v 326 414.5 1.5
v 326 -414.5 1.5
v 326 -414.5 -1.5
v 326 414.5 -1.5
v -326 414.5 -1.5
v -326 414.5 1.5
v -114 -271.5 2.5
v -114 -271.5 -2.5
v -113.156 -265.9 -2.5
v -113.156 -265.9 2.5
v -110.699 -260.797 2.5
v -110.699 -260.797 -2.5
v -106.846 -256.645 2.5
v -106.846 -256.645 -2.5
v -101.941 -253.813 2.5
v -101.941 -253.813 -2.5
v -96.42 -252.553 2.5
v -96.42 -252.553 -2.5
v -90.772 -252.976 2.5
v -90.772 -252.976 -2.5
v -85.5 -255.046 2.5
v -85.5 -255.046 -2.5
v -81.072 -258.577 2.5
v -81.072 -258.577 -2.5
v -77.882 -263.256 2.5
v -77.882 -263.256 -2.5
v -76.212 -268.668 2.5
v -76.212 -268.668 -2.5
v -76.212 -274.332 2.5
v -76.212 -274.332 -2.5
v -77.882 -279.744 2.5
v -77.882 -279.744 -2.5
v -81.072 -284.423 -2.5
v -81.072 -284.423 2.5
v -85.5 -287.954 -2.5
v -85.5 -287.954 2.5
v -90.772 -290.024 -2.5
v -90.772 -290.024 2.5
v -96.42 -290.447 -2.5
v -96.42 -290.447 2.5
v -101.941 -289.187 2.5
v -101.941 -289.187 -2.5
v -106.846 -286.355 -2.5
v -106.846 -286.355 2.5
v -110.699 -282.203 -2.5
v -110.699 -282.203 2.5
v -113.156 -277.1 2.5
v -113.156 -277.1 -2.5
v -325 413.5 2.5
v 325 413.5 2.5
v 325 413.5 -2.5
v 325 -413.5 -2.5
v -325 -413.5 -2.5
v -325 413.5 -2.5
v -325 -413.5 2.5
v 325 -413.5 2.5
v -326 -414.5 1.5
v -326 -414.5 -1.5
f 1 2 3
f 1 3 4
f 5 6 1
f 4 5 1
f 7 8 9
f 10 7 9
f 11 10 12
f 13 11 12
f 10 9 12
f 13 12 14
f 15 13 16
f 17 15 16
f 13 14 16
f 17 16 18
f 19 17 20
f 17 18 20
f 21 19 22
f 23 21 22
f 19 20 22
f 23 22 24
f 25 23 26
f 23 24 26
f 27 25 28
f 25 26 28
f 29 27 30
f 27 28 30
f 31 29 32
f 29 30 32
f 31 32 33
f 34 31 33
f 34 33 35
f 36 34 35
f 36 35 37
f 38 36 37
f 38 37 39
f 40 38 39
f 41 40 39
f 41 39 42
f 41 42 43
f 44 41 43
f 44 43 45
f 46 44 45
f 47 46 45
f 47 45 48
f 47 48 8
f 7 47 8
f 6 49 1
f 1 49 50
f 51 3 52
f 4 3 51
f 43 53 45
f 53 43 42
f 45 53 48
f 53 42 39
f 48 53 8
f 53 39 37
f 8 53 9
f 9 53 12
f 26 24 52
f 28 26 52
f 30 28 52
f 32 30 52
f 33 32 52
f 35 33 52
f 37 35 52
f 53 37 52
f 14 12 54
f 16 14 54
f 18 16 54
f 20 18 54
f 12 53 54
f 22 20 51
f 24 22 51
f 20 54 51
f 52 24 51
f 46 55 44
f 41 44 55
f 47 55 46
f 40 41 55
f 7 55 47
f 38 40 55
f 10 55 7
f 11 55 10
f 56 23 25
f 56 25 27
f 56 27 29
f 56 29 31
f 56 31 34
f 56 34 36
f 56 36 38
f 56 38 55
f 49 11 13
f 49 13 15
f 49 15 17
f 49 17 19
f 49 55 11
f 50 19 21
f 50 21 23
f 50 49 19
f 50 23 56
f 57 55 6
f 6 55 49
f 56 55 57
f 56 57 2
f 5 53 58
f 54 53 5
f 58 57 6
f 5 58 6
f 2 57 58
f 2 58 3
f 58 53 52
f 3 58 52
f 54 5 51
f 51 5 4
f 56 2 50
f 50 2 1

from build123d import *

# Parameters (mm, degrees)
F0_W     = 652
F0_H     = 829
F1_DEPTH = 2.5
F3_D     = 38
F4_SIZE  = 1


with BuildPart() as f1:
    # F0 (on Top) → F1 (new body, symmetric)
    with BuildSketch(Plane.XY):
        Rectangle(F0_W, F0_H)
    extrude(amount=F1_DEPTH, both=True)

    # F3 (through all)
    with Locations(Plane.XY.offset(2.5)):
        with Locations((-95, -271.5)):
            Hole(F3_D / 2)

    # F4
    f4_edges = [f1.edges().sort_by_distance(p)[0] for p in [
        (0, -414.5, -2.5),
        (-326, 0, -2.5),
        (0, 414.5, -2.5),
        (326, 0, -2.5),
        (326, 0, 2.5),
        (0, 414.5, 2.5),
        (-326, 0, 2.5),
        (0, -414.5, 2.5),
    ]]
    chamfer(f4_edges, length=F4_SIZE)


solid = f1.part
